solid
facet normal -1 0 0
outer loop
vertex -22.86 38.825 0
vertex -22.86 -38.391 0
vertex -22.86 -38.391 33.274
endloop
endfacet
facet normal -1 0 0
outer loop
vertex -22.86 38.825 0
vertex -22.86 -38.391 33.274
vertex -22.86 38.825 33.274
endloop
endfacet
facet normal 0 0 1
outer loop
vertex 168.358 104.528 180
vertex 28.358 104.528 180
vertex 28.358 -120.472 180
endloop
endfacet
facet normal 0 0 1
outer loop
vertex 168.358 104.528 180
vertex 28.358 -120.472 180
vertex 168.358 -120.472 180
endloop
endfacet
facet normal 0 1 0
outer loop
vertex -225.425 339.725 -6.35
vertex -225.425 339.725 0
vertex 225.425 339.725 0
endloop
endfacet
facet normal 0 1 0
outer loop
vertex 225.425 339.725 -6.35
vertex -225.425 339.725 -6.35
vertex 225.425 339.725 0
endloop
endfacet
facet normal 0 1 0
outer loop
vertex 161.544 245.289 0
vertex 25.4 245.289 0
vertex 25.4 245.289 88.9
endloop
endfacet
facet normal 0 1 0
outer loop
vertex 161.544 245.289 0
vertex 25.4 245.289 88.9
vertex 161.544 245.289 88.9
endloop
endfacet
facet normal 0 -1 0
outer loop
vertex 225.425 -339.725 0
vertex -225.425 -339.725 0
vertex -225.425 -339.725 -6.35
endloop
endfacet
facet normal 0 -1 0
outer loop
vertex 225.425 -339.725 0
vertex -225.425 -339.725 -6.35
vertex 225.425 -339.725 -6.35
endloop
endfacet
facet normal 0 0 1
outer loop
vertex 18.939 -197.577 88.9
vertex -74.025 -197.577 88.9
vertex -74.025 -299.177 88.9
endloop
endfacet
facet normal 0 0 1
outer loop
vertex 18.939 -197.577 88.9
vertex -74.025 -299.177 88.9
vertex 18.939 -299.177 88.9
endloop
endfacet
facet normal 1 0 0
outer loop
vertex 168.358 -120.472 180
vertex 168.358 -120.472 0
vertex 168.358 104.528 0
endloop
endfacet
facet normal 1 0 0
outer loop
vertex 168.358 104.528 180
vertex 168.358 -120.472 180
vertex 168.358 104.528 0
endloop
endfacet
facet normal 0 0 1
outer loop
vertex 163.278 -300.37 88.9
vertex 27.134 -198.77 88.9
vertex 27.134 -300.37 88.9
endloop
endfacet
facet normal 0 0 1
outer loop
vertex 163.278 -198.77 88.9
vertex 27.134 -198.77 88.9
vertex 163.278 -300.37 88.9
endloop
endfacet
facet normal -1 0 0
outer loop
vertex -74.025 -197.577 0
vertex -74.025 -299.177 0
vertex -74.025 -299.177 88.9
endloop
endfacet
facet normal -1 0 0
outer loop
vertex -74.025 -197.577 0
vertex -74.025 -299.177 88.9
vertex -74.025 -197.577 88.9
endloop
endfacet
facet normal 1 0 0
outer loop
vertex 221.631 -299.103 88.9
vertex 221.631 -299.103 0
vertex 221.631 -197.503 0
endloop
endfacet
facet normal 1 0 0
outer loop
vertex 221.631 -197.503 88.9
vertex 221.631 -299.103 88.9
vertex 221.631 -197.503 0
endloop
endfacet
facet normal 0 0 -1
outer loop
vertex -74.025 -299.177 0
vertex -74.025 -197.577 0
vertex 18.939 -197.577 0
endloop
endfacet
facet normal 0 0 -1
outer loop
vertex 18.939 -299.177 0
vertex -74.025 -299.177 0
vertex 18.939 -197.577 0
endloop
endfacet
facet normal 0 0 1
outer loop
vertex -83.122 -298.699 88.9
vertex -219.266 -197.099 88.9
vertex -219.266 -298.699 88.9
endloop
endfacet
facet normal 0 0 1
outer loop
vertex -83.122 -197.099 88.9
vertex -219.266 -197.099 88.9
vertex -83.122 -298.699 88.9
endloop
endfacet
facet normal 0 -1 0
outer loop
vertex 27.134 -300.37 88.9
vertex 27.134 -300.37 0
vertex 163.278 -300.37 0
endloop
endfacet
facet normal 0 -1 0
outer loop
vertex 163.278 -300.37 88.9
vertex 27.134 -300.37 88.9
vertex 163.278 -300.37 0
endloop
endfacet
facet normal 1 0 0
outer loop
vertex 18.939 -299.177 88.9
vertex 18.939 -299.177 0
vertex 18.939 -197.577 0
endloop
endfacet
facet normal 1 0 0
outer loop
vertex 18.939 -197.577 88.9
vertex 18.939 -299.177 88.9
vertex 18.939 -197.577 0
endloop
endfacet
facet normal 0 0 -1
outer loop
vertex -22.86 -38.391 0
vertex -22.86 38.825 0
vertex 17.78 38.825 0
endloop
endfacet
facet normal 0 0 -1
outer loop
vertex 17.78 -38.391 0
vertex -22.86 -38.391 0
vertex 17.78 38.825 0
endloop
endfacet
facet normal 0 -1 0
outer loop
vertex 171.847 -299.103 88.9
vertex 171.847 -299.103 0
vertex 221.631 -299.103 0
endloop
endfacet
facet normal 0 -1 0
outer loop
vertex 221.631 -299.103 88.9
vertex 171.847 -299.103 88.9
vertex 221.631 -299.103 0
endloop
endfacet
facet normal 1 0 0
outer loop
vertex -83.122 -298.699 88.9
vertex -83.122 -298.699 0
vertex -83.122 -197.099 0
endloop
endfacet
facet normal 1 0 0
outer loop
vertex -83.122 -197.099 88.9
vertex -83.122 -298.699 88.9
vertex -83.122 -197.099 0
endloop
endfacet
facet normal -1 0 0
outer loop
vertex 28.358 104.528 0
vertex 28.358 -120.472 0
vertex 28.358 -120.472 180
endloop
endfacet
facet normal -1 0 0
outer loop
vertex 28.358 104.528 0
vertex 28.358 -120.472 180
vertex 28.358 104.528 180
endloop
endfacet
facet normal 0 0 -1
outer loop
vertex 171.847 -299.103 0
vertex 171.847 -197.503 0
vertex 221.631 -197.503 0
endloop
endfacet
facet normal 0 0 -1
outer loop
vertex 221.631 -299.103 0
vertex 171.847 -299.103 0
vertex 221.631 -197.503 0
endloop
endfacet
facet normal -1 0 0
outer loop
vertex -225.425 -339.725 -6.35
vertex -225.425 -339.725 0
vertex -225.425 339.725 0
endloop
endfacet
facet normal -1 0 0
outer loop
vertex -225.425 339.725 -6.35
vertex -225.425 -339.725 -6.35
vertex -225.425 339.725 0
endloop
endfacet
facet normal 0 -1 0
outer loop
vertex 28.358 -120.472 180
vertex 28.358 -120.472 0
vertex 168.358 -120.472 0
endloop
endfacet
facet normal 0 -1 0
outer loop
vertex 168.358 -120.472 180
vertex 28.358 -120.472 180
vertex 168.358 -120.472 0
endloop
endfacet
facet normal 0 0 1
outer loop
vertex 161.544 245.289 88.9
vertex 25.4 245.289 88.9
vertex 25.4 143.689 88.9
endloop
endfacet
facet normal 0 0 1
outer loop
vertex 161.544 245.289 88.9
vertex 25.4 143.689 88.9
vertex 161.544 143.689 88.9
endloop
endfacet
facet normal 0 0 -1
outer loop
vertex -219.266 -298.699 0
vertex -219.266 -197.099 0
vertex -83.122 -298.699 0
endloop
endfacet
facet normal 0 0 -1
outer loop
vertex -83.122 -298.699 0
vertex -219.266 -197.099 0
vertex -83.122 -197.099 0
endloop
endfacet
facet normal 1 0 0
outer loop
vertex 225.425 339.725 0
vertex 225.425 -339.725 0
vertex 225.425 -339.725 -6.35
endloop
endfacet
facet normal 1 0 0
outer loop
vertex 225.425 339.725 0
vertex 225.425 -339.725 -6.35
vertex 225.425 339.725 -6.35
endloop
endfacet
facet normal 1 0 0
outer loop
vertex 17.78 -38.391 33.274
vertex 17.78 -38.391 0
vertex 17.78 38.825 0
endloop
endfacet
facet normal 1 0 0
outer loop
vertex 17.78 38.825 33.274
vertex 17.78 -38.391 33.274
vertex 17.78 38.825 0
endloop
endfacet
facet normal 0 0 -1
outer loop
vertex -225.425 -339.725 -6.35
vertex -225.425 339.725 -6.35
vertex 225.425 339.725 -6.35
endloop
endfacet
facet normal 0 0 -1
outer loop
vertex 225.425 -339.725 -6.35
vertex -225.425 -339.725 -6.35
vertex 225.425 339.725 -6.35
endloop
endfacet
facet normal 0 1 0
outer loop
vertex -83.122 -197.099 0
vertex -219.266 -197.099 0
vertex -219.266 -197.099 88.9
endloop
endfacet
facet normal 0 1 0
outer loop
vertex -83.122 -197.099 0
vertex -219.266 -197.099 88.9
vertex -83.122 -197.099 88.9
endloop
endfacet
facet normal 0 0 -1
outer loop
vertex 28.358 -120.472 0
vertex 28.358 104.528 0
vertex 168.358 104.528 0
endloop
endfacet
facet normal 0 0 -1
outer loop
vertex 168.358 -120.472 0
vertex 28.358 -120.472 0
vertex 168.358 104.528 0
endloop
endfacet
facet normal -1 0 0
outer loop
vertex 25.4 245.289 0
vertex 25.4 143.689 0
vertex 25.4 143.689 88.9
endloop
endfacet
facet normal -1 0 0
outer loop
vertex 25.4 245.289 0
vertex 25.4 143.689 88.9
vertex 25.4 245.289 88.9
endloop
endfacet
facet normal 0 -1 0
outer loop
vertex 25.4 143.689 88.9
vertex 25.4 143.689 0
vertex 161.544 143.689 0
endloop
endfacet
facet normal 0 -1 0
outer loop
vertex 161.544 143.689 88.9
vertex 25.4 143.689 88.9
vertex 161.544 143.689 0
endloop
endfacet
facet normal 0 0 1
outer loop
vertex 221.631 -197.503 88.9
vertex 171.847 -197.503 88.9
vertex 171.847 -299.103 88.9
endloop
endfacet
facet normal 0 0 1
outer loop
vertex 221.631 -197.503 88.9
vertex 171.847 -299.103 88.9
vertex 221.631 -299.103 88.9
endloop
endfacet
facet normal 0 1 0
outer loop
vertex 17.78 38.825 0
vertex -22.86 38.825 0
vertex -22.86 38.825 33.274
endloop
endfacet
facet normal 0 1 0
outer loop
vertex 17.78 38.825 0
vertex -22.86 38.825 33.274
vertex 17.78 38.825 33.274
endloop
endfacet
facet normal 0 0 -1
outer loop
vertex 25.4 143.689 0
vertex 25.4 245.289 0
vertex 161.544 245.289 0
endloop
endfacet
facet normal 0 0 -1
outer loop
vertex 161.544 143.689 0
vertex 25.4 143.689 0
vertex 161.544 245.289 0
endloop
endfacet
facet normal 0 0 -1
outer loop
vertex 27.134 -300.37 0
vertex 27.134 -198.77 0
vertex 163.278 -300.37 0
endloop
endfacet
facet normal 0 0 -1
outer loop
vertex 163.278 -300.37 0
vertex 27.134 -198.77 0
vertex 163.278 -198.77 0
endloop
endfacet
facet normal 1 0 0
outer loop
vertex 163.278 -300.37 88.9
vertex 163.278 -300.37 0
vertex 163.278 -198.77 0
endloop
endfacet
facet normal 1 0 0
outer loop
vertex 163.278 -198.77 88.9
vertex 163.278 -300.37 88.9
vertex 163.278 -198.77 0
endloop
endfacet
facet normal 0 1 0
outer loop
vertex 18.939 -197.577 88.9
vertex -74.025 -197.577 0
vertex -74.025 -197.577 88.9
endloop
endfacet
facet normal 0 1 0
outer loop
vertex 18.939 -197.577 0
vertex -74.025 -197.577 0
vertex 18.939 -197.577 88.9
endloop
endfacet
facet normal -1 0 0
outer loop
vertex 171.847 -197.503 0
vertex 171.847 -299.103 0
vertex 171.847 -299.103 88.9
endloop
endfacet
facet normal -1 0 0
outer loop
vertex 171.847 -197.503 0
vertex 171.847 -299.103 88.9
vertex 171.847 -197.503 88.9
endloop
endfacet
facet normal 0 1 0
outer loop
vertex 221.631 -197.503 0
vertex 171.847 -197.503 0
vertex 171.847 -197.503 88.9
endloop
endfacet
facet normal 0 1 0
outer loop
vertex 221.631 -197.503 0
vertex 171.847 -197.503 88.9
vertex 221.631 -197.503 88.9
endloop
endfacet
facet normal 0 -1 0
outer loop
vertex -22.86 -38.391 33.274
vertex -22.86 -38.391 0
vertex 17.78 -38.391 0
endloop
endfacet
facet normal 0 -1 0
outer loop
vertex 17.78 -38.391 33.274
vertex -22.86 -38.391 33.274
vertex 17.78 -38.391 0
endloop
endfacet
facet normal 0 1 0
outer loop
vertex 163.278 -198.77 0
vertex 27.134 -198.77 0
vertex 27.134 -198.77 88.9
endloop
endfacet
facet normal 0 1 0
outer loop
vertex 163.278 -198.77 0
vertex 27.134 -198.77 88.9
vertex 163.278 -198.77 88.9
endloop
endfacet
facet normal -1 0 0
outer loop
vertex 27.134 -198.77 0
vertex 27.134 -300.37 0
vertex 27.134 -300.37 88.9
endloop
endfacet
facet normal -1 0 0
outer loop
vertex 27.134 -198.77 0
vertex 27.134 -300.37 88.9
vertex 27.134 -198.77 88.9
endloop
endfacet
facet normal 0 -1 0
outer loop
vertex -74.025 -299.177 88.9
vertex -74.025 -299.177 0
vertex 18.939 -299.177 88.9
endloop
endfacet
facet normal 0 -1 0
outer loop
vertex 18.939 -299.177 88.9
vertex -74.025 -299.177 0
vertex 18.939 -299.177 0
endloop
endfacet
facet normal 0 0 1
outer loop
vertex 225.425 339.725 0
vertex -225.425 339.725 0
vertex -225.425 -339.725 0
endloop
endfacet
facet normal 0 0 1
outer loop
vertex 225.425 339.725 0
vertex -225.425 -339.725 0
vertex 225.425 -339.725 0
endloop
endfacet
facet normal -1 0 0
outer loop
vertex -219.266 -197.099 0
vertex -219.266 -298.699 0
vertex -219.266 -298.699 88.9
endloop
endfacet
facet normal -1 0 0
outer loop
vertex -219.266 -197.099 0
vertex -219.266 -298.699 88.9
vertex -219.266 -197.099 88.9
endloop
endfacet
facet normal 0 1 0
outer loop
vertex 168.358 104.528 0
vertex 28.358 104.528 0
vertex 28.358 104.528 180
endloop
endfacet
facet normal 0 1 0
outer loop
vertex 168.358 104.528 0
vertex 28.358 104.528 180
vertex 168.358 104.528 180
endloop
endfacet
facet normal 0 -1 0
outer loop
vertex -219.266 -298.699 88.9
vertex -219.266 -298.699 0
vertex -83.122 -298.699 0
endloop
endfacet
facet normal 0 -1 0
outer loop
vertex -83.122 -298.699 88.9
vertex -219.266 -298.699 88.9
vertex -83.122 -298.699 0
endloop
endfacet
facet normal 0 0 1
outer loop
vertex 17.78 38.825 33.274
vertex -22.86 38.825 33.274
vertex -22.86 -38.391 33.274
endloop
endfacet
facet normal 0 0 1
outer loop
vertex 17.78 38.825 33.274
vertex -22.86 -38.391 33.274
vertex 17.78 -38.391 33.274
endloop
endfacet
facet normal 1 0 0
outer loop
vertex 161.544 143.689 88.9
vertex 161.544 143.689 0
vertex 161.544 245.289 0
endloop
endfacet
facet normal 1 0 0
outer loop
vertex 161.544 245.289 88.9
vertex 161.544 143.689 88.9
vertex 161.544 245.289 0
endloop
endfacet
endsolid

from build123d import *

# Parameters (mm, degrees)
F0_W      = 450.85
F0_H      = 679.45
F1_DEPTH  = 6.35
F2_W      = 136.144
F2_H      = 101.6
F3_DEPTH  = 88.9
F4_W      = 136.144
F4_H      = 101.6
F5_DEPTH  = 88.9
F6_W      = 49.784
F6_H      = 101.6
F7_DEPTH  = 88.9
F8_W      = 136.144
F8_H      = 101.6
F9_DEPTH  = 88.9
F13_W     = 92.964
F13_H     = 101.6
F14_DEPTH = 88.9
F16_W     = 140
F16_H     = 225
F17_DEPTH = 180
F18_W     = 40.64
F18_H     = 77.216
F19_DEPTH = 33.274


with BuildPart() as f1:
    # F0 (on Top) → F1 (new body)
    with BuildSketch(Plane.XY):
        Rectangle(F0_W, F0_H)
    extrude(amount=-F1_DEPTH)


with BuildPart() as f3:
    # F2 (on face) → F3 (new body)
    with BuildSketch(Plane.XY):
        with Locations((102.825514, -173.369791)):
            Rectangle(F2_W, F2_H)
    extrude(amount=F3_DEPTH)


with BuildPart() as f5:
    # F4 (on face) → F5 (new body)
    with BuildSketch(Plane.XY):
        with Locations((68.072, 158.92881)):
            Rectangle(F4_W, F4_H)
    extrude(amount=F5_DEPTH)


with BuildPart() as f7:
    # F6 (on face) → F7 (new body)
    with BuildSketch(Plane.XY):
        with Locations((-16.620955, -177.183089)):
            Rectangle(F6_W, F6_H)
    extrude(amount=F7_DEPTH)


with BuildPart() as f9:
    # F8 (on face) → F9 (new body)
    with BuildSketch(Plane.XY):
        with Locations((-153.733843, -176.779236)):
            Rectangle(F8_W, F8_H)
    extrude(amount=F9_DEPTH)


with BuildPart() as f3_1:
    # F10: moved
    add(f3.part.moved(Location((-7.62, -76.2, 0))))


with BuildPart() as f7_1:
    # F11: moved
    add(f7.part.moved(Location((213.36, -71.12, 0))))


with BuildPart() as f9_1:
    # F12: moved
    add(f9.part.moved(Location((2.54, -71.12, 0))))


with BuildPart() as f14:
    # F13 (on face) → F14 (new body)
    with BuildSketch(Plane.XY):
        with Locations((-63.102954, -248.37717)):
            Rectangle(F13_W, F13_H)
    extrude(amount=F14_DEPTH)


with BuildPart() as f14_1:
    # F15: moved
    add(f14.part.moved(Location((35.56, 0, 0))))


with BuildPart() as f17:
    # F16 (on face) → F17 (new body)
    with BuildSketch(Plane.XY):
        with Locations((100.897514, -51.15248)):
            Rectangle(F16_W, F16_H)
    extrude(amount=F17_DEPTH)


with BuildPart() as f19:
    # F18 (on face) → F19 (new body)
    with BuildSketch(Plane.XY):
        with Locations((-20.32, -131.863326)):
            Rectangle(F18_W, F18_H)
    extrude(amount=F19_DEPTH)


with BuildPart() as f17_1:
    # F20: moved
    add(f17.part.moved(Location((-2.54, 43.18, 0))))


with BuildPart() as f5_1:
    # F21: moved
    add(f5.part.moved(Location((25.4, 35.56, 0))))


with BuildPart() as f19_1:
    # F22: moved
    add(f19.part.moved(Location((17.78, 132.08, 0))))


solid = Compound([f1.part, f3_1.part, f7_1.part, f9_1.part, f14_1.part, f17_1.part, f5_1.part, f19_1.part])
